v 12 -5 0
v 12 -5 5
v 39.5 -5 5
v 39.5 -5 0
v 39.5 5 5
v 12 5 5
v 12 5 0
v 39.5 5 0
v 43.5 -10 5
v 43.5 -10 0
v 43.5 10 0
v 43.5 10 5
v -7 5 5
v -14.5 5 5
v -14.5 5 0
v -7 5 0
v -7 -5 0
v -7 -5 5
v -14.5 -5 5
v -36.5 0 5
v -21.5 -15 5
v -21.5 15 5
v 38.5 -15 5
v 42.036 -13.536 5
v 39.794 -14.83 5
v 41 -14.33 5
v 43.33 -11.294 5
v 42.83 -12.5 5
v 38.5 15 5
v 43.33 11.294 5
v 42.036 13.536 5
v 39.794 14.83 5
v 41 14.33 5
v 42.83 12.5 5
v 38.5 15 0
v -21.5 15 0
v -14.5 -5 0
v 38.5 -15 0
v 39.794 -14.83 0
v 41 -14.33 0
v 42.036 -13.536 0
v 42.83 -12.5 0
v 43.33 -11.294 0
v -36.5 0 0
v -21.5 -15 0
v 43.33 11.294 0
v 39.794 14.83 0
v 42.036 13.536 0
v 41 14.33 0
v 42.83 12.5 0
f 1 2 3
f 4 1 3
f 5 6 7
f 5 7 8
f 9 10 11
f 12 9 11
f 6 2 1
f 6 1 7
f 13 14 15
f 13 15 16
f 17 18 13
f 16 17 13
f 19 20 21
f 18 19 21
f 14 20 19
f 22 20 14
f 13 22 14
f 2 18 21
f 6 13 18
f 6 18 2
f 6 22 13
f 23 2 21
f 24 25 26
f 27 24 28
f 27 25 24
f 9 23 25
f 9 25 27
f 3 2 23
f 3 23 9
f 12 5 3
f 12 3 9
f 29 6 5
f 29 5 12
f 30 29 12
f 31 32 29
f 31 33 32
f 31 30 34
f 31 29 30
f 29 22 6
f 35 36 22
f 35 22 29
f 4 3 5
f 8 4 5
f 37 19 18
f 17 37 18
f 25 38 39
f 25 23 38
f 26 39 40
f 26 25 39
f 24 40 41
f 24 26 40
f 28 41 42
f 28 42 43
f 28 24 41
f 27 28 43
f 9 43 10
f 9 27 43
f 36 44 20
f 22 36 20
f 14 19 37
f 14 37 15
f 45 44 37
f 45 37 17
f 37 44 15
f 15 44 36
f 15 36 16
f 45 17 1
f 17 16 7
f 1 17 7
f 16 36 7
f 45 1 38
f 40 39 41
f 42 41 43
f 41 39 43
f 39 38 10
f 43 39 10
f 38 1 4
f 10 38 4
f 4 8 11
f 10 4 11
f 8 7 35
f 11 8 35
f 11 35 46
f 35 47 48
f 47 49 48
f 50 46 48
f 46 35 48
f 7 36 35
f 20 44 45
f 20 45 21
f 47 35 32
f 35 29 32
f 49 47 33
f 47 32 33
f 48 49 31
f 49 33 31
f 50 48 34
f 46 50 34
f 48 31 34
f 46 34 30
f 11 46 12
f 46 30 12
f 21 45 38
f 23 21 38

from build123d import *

# Parameters (mm, degrees)
F0_W     = 80
F0_H     = 30
F1_DEPTH = 5
F2_W     = 7.5
F2_H     = 10
F3_DEPTH = 25
F4_W     = 27.5
F4_H     = 10
F5_DEPTH = 5
F6_SIZE  = 14.99999
F7_R     = 5


# Not quite as in the source:
# - a fillet or chamfer is up to 0.001 mm smaller than in the source, because OpenCascade refuses the exact size


with BuildPart() as f1:
    # F0 (on Top) → F1 (new body)
    with BuildSketch(Plane.XY):
        with Locations((3.5, 0)):
            Rectangle(F0_W, F0_H)
    extrude(amount=F1_DEPTH)

    # F2 (on face) → F3 (cut)
    with BuildSketch(Plane.XY.offset(5)):
        with Locations((-10.75, 0)):
            Rectangle(F2_W, F2_H)
    extrude(amount=-F3_DEPTH, mode=Mode.SUBTRACT)

    # F4 (on face) → F5 (cut)
    with BuildSketch(Plane.XY.offset(5)):
        with Locations((25.75, 0)):
            Rectangle(F4_W, F4_H)
    extrude(amount=-F5_DEPTH, mode=Mode.SUBTRACT)

    # F6 (size 15 in the source; OpenCascade refuses exactly that, so slightly less here)
    f6_edges = [f1.edges().sort_by_distance(p)[0] for p in [
        (-36.5, -15, 2.5),
        (-36.5, 15, 2.5),
    ]]
    chamfer(f6_edges, length=F6_SIZE)

    # F7
    f7_edges = [f1.edges().sort_by_distance(p)[0] for p in [
        (43.5, -15, 2.5),
        (43.5, 15, 2.5),
    ]]
    fillet(f7_edges, radius=F7_R)


solid = f1.part
